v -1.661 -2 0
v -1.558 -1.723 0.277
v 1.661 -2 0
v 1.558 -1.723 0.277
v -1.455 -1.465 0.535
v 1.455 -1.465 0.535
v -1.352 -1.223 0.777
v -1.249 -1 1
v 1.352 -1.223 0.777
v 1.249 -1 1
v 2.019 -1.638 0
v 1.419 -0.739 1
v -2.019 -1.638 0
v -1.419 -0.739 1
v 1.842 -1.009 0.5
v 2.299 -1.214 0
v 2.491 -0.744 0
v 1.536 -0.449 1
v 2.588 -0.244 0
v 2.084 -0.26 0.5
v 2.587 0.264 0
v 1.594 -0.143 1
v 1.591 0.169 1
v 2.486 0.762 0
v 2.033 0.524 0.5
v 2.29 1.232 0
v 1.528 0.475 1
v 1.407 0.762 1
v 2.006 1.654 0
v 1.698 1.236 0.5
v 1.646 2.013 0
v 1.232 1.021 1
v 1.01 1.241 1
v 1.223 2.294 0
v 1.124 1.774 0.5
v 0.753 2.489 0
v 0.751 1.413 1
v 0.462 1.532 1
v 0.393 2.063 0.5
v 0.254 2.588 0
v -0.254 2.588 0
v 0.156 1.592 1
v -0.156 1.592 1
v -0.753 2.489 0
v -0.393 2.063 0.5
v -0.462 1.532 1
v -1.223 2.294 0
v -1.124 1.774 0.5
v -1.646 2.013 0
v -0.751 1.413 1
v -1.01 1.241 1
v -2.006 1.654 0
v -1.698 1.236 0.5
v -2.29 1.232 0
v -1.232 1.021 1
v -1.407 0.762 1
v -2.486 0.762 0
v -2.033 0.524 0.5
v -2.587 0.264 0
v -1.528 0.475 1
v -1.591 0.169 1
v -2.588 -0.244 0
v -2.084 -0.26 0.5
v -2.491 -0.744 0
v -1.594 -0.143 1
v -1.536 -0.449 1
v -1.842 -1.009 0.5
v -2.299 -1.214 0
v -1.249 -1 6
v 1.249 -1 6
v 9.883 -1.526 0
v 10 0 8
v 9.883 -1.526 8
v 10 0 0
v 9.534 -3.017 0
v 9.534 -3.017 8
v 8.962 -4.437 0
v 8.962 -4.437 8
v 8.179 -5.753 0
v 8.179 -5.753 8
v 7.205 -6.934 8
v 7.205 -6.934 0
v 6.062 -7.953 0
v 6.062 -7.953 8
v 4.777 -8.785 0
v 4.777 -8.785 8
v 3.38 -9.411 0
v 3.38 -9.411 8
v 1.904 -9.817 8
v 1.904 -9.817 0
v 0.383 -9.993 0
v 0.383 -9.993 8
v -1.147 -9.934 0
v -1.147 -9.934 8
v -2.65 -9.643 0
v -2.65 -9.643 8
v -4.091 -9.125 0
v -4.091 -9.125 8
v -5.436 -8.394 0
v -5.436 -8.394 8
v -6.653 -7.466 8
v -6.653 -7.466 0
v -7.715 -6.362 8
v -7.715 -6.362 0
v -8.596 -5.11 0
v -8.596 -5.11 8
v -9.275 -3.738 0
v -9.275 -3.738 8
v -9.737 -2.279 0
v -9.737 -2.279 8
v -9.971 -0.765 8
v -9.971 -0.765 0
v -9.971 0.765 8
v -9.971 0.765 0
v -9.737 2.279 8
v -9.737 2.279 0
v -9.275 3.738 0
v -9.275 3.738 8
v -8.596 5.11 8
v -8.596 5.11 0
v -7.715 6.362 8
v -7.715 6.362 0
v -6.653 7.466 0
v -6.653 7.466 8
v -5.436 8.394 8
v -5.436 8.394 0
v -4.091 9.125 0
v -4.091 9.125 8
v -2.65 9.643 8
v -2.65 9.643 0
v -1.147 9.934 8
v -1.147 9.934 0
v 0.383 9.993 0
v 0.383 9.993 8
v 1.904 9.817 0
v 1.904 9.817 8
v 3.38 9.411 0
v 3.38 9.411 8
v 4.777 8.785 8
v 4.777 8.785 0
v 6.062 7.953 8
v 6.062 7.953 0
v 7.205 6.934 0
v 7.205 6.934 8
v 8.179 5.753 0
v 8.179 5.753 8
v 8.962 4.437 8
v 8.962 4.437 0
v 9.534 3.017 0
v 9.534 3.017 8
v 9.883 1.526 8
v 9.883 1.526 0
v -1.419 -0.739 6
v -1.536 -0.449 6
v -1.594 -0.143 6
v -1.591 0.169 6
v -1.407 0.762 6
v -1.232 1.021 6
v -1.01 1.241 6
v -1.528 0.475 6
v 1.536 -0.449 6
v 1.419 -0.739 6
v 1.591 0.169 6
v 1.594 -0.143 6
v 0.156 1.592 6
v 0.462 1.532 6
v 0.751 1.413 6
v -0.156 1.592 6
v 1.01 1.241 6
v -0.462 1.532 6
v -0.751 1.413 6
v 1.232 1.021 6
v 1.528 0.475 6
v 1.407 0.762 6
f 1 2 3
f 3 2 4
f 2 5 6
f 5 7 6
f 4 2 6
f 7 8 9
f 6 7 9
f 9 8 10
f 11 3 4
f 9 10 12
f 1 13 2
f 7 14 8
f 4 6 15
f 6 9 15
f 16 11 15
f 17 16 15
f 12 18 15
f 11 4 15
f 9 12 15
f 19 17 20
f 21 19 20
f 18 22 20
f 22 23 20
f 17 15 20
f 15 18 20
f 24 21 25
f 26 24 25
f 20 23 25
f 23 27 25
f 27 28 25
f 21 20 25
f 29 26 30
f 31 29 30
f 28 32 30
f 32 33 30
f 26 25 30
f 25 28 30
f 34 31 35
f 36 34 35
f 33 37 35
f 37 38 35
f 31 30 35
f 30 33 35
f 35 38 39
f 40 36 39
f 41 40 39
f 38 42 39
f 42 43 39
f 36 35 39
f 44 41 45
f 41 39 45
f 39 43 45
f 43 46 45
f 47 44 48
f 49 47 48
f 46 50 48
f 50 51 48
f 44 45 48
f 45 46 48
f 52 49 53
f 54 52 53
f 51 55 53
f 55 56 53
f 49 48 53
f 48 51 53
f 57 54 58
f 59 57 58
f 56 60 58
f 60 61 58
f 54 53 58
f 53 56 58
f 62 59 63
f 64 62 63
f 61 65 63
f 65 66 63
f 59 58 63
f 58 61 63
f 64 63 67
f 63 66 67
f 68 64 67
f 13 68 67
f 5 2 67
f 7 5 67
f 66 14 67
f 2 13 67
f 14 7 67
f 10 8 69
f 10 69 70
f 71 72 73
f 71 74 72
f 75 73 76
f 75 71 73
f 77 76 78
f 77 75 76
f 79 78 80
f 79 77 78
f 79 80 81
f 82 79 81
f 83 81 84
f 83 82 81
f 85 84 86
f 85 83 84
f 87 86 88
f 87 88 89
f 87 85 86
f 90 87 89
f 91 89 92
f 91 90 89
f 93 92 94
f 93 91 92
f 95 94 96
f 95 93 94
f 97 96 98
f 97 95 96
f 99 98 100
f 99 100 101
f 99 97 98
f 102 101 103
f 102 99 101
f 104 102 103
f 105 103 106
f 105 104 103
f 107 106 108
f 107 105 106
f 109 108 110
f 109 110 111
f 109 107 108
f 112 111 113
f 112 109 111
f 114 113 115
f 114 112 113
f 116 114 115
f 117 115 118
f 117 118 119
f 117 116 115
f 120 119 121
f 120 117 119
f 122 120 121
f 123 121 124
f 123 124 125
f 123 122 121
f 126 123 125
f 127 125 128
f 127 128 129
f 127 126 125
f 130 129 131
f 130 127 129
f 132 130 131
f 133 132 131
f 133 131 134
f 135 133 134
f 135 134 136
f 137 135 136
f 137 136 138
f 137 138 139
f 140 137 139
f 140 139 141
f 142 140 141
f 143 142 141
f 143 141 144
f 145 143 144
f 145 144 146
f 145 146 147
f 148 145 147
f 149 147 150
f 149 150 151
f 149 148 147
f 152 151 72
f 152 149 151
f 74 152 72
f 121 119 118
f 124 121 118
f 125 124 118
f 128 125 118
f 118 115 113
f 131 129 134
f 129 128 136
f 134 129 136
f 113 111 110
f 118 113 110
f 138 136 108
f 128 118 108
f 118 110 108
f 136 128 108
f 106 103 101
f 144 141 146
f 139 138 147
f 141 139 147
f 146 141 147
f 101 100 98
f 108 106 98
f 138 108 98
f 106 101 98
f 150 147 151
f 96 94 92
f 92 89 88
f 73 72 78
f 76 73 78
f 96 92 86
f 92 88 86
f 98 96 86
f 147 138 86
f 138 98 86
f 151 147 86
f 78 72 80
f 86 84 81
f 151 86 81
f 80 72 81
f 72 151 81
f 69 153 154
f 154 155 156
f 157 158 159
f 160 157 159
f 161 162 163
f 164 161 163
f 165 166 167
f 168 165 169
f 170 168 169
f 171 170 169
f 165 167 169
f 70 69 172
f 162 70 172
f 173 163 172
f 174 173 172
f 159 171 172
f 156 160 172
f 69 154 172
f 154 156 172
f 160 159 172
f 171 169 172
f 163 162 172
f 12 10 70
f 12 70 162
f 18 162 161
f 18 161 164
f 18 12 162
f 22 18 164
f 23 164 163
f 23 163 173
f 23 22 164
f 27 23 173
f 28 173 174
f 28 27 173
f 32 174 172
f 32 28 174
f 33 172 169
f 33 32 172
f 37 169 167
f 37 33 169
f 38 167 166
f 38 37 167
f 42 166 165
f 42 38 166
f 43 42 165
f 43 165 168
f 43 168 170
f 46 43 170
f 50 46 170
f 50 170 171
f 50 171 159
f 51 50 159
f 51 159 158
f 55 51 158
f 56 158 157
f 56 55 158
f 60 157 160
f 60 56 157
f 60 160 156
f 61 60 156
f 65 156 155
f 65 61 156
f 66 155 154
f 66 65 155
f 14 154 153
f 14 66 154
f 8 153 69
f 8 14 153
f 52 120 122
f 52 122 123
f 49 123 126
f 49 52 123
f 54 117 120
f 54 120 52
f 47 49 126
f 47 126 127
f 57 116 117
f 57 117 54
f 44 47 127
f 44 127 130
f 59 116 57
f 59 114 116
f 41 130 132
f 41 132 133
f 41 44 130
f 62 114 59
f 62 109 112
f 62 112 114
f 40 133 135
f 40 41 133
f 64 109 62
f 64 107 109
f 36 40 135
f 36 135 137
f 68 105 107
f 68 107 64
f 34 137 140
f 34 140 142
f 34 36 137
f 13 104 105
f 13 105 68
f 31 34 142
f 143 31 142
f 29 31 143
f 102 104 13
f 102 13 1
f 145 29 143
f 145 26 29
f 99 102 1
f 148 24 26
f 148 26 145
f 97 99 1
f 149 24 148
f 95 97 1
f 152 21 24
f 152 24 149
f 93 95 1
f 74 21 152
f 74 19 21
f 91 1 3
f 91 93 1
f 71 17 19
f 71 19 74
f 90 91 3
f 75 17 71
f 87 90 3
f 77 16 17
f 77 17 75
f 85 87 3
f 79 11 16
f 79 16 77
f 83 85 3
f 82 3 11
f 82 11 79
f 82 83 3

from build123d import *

# Parameters (mm, degrees)
SKETCH_1_W            = 10
SKETCH_1_H            = 8
CUT_EXTRUDE_928_DEPTH = 6
CHAMFER_1_SIZE        = 1


with BuildPart() as part:
    # Эскиз1 → Повернуть1 (revolve)
    with BuildSketch(Plane(origin=(0, 0, 0), x_dir=(1, 0, 0), z_dir=(0, 1, 0))):
        with Locations((-5, -4)):
            Rectangle(SKETCH_1_W, SKETCH_1_H)
    revolve(axis=Axis((0, 0, 10.353242845), (0, 0, -1)))

    # Эскиз2 → Cut-Extrude 928 (cut)
    with BuildSketch(Plane(origin=(0, 0, 0), x_dir=(-1, 0, 0), z_dir=(0, 0, -1))):
        with BuildLine():
            Line((1.2489996, -1), (-1.2489996, -1))
            ThreePointArc((-1.2489996, -1), (0, 1.6), (1.2489996, -1))
        make_face()
    extrude(amount=-CUT_EXTRUDE_928_DEPTH, mode=Mode.SUBTRACT)

    # Фаска1
    chamfer_1_edges = [part.edges().sort_by_distance(p)[0] for p in [
        (0, 1.6, 0),
        (0, -1, 0),
    ]]
    chamfer(chamfer_1_edges, length=CHAMFER_1_SIZE)


solid = part.part
